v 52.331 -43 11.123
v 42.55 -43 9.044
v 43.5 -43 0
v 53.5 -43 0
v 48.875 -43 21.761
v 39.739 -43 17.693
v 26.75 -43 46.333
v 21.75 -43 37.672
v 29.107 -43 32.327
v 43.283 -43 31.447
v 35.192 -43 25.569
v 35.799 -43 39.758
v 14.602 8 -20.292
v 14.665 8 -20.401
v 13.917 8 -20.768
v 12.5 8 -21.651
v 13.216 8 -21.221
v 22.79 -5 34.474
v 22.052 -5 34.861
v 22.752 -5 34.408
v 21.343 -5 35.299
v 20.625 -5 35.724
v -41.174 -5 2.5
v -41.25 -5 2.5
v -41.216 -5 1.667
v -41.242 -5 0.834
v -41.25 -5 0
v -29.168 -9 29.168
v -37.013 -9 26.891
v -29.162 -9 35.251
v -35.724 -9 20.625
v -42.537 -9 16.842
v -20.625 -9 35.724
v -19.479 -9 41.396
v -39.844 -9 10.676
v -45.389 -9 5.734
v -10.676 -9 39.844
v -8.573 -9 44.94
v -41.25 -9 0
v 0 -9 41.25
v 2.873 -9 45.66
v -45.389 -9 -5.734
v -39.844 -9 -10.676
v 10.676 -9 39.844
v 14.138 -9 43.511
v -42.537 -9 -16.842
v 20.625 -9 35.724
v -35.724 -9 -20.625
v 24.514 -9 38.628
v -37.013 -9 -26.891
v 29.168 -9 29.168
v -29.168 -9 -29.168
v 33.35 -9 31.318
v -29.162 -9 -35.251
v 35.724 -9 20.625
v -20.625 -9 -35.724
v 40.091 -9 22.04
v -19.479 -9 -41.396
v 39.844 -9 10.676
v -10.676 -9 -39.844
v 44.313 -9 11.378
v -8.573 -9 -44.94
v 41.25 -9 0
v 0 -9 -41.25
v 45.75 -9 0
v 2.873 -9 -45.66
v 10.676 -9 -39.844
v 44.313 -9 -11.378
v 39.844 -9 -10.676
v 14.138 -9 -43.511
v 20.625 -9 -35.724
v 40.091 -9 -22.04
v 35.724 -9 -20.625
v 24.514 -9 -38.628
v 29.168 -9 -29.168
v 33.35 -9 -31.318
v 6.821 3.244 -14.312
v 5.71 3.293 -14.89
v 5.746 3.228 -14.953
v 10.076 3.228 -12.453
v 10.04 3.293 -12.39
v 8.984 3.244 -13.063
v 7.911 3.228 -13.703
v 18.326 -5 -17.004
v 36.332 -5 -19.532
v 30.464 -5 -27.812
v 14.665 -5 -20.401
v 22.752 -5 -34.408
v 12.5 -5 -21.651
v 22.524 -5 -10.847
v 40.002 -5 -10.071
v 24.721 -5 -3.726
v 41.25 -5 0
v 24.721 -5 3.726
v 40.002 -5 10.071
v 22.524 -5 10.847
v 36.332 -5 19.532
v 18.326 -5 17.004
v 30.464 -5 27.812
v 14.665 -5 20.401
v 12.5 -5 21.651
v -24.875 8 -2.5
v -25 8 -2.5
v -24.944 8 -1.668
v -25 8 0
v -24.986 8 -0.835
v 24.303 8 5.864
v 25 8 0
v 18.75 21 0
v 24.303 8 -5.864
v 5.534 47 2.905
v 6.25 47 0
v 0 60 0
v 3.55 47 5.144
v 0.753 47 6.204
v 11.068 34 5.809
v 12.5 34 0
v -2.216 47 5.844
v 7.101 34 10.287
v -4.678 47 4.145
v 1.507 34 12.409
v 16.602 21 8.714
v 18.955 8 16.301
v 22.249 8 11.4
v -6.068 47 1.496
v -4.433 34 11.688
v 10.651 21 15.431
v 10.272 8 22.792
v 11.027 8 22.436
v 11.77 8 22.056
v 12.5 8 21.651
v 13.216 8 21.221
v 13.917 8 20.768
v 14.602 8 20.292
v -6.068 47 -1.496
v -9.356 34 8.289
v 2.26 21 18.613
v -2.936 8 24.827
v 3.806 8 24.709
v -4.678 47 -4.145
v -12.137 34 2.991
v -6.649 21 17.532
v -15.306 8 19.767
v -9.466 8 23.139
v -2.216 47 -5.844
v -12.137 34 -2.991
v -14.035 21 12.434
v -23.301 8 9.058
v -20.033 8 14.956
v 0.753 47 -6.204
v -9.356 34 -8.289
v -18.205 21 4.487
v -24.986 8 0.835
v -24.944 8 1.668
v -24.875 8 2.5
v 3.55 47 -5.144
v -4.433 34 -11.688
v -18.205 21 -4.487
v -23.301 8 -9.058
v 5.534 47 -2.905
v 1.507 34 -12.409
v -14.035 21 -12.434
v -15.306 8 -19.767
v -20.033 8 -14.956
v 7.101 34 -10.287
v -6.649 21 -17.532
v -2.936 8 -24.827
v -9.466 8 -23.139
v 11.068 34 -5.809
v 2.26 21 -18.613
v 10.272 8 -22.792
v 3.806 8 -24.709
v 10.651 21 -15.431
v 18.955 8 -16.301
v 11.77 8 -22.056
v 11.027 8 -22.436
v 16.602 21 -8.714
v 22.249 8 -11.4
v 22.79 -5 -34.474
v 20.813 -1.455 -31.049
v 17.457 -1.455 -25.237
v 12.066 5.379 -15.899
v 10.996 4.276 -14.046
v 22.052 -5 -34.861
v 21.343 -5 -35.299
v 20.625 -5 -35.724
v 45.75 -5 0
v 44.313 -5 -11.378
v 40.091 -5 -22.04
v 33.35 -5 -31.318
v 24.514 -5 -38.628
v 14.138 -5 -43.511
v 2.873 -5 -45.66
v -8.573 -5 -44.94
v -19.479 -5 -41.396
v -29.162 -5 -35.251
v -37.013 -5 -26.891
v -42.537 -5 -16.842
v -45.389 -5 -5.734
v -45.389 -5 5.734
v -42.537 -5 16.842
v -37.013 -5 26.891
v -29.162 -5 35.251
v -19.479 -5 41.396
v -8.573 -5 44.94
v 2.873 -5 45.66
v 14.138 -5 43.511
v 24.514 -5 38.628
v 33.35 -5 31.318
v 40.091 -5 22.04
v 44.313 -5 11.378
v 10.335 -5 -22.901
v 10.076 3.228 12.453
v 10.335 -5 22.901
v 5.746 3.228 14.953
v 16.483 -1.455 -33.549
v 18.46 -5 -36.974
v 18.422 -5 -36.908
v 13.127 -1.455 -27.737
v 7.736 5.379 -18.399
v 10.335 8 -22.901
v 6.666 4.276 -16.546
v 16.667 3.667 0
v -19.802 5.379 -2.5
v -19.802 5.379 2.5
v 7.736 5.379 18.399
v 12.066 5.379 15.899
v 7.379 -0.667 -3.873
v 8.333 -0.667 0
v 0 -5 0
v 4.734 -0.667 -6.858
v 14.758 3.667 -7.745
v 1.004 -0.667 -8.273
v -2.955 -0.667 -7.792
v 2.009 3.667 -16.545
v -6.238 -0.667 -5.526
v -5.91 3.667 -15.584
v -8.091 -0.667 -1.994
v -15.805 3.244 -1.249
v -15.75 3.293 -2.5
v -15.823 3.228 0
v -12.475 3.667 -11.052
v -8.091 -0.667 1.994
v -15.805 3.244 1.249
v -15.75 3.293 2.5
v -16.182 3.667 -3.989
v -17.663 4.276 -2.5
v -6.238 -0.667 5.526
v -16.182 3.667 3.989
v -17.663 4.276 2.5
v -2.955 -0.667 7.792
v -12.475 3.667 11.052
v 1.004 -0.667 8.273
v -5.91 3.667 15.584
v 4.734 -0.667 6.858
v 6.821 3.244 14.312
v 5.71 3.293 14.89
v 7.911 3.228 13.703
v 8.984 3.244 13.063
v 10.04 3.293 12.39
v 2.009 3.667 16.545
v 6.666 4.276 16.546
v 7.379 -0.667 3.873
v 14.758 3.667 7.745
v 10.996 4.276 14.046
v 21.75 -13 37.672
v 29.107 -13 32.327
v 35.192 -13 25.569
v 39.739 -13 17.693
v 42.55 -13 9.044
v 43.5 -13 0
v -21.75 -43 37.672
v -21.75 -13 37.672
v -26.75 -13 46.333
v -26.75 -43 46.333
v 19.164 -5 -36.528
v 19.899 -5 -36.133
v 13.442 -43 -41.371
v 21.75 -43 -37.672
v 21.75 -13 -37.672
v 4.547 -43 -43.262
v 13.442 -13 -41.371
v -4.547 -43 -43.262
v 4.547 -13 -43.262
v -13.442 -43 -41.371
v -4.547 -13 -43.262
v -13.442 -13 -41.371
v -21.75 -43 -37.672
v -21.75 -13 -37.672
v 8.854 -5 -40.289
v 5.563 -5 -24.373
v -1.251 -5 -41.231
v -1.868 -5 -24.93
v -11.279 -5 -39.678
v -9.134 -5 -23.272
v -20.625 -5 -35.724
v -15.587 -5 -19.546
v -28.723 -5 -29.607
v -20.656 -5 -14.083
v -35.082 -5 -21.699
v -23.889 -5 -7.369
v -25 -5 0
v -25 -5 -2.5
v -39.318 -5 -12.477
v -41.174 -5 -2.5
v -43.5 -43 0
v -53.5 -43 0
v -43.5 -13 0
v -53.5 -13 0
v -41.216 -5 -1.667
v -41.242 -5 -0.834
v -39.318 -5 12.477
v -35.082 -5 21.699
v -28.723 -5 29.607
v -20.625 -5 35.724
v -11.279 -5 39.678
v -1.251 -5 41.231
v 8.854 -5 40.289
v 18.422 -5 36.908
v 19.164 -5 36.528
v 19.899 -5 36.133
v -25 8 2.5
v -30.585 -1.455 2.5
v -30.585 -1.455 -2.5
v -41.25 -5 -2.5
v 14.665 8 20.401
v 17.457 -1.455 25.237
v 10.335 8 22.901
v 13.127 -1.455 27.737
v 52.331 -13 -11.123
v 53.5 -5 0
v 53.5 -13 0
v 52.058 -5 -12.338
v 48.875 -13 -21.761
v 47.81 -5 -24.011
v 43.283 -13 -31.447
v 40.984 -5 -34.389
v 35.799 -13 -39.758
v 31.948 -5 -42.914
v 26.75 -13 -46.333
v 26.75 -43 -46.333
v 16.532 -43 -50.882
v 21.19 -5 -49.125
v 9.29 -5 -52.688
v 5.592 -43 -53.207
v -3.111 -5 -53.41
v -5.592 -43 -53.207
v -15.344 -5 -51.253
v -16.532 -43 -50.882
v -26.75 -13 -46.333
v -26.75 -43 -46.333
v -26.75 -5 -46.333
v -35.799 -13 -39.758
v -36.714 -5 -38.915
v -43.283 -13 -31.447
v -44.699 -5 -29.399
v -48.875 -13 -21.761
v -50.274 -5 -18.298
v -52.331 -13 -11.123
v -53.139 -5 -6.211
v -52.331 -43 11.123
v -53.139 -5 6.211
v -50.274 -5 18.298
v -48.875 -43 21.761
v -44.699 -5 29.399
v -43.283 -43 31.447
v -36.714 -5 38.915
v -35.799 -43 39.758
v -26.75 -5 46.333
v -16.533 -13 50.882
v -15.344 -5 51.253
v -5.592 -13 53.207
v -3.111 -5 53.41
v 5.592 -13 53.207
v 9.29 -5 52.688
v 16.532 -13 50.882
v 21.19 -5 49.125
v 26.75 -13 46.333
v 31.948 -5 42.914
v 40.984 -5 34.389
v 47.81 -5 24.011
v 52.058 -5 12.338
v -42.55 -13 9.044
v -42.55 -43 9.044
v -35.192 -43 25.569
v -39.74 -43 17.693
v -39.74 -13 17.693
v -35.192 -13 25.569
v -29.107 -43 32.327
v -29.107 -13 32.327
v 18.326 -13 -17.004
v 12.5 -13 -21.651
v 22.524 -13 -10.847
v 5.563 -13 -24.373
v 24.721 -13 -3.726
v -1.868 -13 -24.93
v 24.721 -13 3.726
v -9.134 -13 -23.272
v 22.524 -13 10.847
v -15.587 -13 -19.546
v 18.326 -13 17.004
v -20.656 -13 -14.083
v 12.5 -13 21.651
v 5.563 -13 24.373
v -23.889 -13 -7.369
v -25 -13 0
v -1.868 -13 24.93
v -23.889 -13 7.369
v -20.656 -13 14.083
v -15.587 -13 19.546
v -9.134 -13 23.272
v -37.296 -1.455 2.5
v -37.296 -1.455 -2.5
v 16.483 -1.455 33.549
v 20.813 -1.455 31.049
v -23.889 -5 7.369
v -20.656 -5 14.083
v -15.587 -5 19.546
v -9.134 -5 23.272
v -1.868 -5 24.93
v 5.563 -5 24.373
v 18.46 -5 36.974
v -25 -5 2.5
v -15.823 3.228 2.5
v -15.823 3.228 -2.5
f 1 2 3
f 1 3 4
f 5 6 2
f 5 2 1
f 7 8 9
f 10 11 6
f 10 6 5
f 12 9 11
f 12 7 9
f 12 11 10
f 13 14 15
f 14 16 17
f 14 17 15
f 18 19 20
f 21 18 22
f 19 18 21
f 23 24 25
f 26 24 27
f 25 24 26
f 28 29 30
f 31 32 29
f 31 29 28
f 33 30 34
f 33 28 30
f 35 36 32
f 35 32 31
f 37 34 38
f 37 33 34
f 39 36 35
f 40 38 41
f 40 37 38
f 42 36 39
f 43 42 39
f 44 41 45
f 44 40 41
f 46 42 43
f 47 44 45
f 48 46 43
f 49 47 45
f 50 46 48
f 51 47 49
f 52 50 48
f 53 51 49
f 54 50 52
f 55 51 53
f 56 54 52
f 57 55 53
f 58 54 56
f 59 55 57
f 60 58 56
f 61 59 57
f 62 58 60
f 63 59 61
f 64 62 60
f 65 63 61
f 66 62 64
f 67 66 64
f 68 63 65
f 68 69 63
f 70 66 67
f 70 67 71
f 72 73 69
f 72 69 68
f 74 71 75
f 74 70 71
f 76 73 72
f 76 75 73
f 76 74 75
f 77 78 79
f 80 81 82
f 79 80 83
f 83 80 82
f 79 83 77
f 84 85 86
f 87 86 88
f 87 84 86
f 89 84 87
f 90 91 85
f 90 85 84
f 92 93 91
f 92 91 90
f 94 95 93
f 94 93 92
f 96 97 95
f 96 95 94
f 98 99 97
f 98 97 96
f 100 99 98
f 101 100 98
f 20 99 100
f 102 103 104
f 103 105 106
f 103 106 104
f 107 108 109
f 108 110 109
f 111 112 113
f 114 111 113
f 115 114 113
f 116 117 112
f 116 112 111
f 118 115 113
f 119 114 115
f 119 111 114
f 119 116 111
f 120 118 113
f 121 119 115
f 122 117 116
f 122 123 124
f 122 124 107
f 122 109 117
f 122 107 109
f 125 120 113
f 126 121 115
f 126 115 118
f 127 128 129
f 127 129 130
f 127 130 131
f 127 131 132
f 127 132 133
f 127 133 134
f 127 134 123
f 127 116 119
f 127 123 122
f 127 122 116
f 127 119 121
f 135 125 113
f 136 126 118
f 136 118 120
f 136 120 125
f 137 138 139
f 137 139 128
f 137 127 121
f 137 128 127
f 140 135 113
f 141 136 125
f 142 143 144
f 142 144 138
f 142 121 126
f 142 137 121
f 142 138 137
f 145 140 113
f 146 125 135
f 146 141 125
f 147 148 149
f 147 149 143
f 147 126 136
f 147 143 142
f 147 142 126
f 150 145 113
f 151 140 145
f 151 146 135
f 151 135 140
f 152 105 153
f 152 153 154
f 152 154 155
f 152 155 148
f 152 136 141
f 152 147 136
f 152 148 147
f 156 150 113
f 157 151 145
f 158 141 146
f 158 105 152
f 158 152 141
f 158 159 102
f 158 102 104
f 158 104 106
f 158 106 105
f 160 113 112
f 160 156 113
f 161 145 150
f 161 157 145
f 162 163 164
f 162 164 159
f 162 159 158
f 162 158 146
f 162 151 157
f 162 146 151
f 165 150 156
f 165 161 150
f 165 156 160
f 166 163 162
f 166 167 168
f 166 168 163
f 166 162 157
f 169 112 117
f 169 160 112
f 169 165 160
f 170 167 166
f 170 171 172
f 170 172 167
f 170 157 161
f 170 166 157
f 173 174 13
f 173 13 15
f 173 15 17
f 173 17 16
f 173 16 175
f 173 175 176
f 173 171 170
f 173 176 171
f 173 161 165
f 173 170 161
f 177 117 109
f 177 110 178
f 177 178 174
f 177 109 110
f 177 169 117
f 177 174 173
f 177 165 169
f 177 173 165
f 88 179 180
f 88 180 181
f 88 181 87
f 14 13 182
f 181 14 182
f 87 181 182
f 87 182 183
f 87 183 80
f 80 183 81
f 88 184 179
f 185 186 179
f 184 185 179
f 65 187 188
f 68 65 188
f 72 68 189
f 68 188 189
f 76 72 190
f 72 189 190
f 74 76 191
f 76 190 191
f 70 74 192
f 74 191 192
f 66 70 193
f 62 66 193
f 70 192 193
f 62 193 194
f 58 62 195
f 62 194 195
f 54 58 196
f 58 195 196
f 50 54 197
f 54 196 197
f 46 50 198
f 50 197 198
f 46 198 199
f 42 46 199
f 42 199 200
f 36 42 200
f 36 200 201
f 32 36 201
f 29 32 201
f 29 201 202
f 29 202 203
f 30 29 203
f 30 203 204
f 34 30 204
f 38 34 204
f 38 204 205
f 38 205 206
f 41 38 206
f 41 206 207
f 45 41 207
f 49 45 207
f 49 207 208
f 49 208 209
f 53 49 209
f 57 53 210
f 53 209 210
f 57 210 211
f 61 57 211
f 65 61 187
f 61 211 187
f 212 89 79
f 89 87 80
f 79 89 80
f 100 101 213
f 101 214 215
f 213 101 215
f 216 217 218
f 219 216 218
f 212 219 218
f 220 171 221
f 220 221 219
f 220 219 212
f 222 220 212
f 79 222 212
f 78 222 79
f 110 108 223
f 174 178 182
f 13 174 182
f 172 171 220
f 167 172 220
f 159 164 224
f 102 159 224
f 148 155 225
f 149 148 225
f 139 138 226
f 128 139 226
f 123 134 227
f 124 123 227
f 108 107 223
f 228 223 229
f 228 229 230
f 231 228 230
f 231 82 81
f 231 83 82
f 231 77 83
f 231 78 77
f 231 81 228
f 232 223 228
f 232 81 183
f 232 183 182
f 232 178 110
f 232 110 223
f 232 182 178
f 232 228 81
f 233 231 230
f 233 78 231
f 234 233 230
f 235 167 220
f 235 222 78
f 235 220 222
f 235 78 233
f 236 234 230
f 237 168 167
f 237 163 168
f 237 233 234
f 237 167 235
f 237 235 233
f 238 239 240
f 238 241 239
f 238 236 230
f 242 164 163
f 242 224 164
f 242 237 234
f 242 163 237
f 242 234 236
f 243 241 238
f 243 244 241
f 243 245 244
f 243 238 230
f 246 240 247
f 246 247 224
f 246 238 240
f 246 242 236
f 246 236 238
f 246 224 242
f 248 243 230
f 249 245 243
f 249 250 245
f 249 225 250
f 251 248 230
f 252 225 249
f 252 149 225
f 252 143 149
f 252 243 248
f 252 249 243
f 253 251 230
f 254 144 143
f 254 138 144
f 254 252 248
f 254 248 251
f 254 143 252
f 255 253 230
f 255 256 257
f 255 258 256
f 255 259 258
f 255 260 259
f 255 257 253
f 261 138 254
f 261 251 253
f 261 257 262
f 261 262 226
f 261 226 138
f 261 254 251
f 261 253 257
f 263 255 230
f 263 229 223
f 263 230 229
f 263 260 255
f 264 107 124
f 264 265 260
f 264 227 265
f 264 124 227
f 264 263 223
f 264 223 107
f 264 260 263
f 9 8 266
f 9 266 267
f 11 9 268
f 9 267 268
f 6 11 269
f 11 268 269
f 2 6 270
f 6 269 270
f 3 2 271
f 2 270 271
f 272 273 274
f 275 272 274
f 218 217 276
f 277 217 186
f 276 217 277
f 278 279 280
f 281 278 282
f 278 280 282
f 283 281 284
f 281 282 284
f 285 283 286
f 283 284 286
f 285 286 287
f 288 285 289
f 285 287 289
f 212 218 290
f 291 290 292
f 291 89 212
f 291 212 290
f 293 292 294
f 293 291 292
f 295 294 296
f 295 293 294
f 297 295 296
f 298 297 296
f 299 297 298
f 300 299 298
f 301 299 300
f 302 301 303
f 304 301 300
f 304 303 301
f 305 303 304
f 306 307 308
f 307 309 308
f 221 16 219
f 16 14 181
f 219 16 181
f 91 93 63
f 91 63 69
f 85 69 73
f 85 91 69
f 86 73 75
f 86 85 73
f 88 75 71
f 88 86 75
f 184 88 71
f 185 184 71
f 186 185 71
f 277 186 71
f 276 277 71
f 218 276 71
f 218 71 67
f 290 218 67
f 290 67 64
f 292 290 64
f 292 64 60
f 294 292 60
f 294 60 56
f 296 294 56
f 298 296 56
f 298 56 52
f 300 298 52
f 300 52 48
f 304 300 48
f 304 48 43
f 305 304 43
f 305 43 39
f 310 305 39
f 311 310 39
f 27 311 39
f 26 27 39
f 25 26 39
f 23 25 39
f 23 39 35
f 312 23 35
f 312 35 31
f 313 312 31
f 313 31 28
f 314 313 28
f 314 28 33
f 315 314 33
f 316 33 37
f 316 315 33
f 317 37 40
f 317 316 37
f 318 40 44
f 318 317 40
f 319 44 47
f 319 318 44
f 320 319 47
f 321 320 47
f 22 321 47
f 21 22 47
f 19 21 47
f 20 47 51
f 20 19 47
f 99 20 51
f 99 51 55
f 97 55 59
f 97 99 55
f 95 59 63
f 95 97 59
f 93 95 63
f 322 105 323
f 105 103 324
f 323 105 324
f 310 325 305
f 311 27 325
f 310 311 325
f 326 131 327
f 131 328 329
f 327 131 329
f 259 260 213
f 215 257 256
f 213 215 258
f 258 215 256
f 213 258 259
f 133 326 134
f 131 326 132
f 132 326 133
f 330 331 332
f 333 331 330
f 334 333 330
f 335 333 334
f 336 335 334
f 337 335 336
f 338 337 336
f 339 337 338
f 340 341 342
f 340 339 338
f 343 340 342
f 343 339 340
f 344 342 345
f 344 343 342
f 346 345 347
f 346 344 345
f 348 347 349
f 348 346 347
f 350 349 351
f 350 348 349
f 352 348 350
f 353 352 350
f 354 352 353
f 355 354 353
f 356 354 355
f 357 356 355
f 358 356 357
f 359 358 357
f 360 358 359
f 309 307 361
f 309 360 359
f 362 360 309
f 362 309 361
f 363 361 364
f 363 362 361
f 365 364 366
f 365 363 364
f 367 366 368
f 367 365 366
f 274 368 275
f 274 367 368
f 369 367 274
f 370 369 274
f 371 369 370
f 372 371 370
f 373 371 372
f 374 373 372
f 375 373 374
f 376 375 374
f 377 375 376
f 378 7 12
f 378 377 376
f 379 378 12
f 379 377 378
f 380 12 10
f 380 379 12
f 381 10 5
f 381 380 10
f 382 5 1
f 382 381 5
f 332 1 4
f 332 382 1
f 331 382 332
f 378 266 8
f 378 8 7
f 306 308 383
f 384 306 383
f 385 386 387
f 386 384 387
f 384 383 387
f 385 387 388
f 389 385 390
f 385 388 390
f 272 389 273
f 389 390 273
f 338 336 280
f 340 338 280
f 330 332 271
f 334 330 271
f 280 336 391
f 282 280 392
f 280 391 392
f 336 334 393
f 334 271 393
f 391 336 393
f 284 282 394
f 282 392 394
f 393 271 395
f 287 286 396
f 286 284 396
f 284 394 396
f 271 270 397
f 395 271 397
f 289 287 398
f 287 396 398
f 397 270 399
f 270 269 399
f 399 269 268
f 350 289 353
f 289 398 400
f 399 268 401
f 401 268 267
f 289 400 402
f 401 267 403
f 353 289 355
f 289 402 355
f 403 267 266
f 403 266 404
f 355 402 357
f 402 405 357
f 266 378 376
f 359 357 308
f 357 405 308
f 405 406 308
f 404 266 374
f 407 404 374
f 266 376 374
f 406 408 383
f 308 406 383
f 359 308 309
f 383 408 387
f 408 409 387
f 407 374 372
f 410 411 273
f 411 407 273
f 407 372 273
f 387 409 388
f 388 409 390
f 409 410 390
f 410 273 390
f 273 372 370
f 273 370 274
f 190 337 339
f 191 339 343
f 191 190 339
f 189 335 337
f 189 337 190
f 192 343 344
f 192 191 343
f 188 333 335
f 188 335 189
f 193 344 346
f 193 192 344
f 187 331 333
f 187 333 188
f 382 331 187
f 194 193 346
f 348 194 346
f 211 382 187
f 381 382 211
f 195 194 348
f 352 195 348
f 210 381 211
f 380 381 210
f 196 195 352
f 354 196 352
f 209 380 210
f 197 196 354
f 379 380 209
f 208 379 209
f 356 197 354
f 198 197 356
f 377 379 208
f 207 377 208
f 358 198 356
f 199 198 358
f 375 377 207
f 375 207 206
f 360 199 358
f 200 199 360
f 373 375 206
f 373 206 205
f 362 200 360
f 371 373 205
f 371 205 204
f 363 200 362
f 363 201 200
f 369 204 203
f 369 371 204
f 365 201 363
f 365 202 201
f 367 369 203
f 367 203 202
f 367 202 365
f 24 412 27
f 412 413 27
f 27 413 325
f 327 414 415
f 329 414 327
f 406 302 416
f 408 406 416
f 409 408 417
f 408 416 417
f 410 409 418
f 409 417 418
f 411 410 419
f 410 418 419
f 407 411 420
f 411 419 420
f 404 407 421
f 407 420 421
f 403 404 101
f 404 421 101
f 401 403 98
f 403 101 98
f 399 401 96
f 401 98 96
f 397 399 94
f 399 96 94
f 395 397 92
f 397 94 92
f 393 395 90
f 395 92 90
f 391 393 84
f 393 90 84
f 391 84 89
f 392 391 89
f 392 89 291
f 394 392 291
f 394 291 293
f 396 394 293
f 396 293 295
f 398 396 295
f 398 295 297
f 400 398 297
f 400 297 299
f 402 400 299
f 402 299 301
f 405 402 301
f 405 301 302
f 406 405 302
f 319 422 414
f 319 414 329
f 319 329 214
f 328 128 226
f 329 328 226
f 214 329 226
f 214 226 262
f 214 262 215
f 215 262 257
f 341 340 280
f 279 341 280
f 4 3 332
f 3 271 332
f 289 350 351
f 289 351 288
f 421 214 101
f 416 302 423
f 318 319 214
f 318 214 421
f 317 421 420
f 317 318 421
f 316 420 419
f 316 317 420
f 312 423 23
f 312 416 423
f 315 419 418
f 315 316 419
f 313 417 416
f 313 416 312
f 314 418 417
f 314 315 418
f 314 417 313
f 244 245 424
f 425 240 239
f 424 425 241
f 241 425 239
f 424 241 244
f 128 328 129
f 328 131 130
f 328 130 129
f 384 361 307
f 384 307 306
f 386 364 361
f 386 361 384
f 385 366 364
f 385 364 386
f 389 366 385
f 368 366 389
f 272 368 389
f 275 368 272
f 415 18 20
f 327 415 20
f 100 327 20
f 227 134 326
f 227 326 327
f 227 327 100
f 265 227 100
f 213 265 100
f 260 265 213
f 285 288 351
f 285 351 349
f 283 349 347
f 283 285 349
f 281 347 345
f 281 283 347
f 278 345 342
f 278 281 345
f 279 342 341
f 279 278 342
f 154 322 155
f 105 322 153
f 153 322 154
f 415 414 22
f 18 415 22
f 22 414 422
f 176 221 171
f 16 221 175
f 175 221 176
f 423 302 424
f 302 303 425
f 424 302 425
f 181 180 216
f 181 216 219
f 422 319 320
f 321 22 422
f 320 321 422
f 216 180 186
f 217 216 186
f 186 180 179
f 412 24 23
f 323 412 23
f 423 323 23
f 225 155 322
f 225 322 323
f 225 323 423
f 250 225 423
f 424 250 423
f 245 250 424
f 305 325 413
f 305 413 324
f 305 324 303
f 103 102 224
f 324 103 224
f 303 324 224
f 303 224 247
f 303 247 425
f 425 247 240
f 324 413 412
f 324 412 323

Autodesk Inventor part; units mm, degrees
ref_plane "YZ Plane" through (0, 0, 0) normal (1, 0, 0) x (0, 1, 0)
ref_plane "XY Plane" through (0, 0, 0) normal (0, 0, 1) x (1, 0, 0)
sketch "Sketch1" plane through (0, 0, 0) normal (0, 0, 1) x (1, 0, 0)
  line L0 (0, 60) -> (25, 8)
  line L1 (25, 8) -> (0, -5)
  line L2 (0, -5) -> (0, 0)
  line L3 (0, 0) -> (0, 60)
  dimension "d1" = 60
  dimension "d2" = 13
  dimension "d18" = 5
  dimension "d19" = 25
revolve "Revolution1" add sketch "Sketch1" angle 360 about axis through (0, 0, 0) along (0, 1, 0)
ref_plane "Work Plane1" through (0, -5, 0) normal (0, 1, 0) x (-1, 0, 0)
sketch "Sketch3" plane through (0, -5, 0) normal (0, 1, 0) x (-1, 0, 0)
  circle A0 centre (0, 0) radius 25
  circle A1 centre (0, 0) radius 41.25
  dimension "d7" = 50
  dimension "d8" = 82.5
extrude "Extrusion1" add sketch "Sketch3" against normal blind 8
sketch "Sketch4" plane through (0, 0, 0) normal (0, 0, 1) x (1, 0, 0)
  line L0 (0, 60) -> (-25, 8) projected
  line L1 (41.25, -5) -> (-41.25, -5) projected
  line L2 (-25, -13) -> (-25, -5) projected
  line L3 (25, -13) -> (25, -5) projected
  line L4 (41.25, -5) -> (41.25, -13) projected
  line L5 (-41.25, -5) -> (-41.25, -13) projected
  line L6 (25, 8) -> (0, -5) projected
  line L7 (0, 60) -> (25, 8) projected
  line L8 (-37.2957, -1.4547) -> (-41.25, -5)
  line L9 (-25, -5) -> (-15.8228, 3.2278)
  line L10 (-41.25, -5) -> (-25, -5)
  line L11 (-25, 8) -> (25, 8) projected
  line L12 (-25, 8) -> (-12.5712, 19.143)
  line L13 (-12.5712, 19.143) -> (-7.4345, 10.7484)
  line L14 (-7.4345, 10.7484) -> (-15.8228, 3.2278)
  line L15 (-25, 8) -> (-30.5847, -1.4547)
  line L16 (-37.2957, -1.4547) -> (-30.5847, -1.4547)
  point P0 (0, 0)
  point P1 (0, -5)
  point P2 (-10.5, 8)
extrude "Extrusion2" add sketch "Sketch4" along normal mid plane 5 contours L11 L14 L9 L1 L8 L16 L15
pattern_circular "Circular Pattern1" count 3 over 360 about axis through (0, -10, 0) along (0, 1, 0) of "Extrusion2"
sketch "Sketch5" plane through (0, -5, 0) normal (0, 1, 0) x (1, 0, 0)
  circle A0 centre (0, 0) radius 39.5
  circle A1 centre (0, 0) radius 28.5
  dimension "d16" = 79
  dimension "d17" = 57
sketch "Sketch6" plane through (0, -5, 0) normal (0, 1, 0) x (1, 0, 0)
  circle A0 centre (0, 0) radius 41.25
  circle A1 centre (0, 0) radius 45.75
  circle A2 centre (0, 0) radius 53.5003
  dimension "d20" = 82.5
  dimension "d21" = 4.5
extrude "Extrusion3" add sketch "Sketch6" against normal blind 8 contours A1 | A2
sketch "Sketch7" plane through (0, -5, 0) normal (0, 1, 0) x (1, 0, 0)
  circle A0 centre (0, 0) radius 45.75 projected
  circle A1 centre (0, 0) radius 41.25 projected
extrude "Extrusion4" cut sketch "Sketch7" against normal blind 4
sketch "Sketch8" plane through (0, -13, 0) normal (0, -1, 0) x (1, 0, 0)
  circle A0 centre (0, 0) radius 53.5003
  circle A1 centre (0, 0) radius 53.5003 projected
  circle A2 centre (0, 0) radius 43.5003
  line L0 (0, -60.7067) -> (0, 74.3031)
  line L1 (53.5003, -65.9653) -> (53.5003, 59.8233)
  line L2 (-62.5744, 0) -> (102.4614, 0)
  line L3 (-37.8313, -65.5258) -> (42.3793, 73.4032)
  line L4 (39.8021, -68.9393) -> (-31.97, 55.3736)
  point P0 (26.7502, 46.3326)
  point P1 (21.7502, 37.6724)
  point P2 (43.5003, 0)
  point P3 (53.5003, 0)
  point P4 (-21.7502, -37.6724)
  point P5 (-26.7502, -46.3326)
  point P6 (26.7502, -46.3326)
  point P7 (21.7502, -37.6724)
  point P8 (-21.7502, 37.6724)
  point P9 (-26.7502, 46.3326)
  point P10 (-53.5003, 0)
  point P11 (-43.5003, 0)
  dimension "d26" = 0
  dimension "d27" = 10
  dimension "d28" = 120
  dimension "d29" = 120
  dimension "d30" = 120
extrude "Extrusion5" add sketch "Sketch8" along normal blind 30 contours L2 A2 L3 A0 | A0 L0 A2 L4 | A0 L3 A2 L0 | L4 A2 L2 A0 picked at (40.4215, 23.3374) picked at (5.6147, -49.6757) picked at (-3.0967, -49.896) picked at (-40.4215, 23.3374)
equation "\"d29\" = d28"
properties part number "Reflector+feet"
